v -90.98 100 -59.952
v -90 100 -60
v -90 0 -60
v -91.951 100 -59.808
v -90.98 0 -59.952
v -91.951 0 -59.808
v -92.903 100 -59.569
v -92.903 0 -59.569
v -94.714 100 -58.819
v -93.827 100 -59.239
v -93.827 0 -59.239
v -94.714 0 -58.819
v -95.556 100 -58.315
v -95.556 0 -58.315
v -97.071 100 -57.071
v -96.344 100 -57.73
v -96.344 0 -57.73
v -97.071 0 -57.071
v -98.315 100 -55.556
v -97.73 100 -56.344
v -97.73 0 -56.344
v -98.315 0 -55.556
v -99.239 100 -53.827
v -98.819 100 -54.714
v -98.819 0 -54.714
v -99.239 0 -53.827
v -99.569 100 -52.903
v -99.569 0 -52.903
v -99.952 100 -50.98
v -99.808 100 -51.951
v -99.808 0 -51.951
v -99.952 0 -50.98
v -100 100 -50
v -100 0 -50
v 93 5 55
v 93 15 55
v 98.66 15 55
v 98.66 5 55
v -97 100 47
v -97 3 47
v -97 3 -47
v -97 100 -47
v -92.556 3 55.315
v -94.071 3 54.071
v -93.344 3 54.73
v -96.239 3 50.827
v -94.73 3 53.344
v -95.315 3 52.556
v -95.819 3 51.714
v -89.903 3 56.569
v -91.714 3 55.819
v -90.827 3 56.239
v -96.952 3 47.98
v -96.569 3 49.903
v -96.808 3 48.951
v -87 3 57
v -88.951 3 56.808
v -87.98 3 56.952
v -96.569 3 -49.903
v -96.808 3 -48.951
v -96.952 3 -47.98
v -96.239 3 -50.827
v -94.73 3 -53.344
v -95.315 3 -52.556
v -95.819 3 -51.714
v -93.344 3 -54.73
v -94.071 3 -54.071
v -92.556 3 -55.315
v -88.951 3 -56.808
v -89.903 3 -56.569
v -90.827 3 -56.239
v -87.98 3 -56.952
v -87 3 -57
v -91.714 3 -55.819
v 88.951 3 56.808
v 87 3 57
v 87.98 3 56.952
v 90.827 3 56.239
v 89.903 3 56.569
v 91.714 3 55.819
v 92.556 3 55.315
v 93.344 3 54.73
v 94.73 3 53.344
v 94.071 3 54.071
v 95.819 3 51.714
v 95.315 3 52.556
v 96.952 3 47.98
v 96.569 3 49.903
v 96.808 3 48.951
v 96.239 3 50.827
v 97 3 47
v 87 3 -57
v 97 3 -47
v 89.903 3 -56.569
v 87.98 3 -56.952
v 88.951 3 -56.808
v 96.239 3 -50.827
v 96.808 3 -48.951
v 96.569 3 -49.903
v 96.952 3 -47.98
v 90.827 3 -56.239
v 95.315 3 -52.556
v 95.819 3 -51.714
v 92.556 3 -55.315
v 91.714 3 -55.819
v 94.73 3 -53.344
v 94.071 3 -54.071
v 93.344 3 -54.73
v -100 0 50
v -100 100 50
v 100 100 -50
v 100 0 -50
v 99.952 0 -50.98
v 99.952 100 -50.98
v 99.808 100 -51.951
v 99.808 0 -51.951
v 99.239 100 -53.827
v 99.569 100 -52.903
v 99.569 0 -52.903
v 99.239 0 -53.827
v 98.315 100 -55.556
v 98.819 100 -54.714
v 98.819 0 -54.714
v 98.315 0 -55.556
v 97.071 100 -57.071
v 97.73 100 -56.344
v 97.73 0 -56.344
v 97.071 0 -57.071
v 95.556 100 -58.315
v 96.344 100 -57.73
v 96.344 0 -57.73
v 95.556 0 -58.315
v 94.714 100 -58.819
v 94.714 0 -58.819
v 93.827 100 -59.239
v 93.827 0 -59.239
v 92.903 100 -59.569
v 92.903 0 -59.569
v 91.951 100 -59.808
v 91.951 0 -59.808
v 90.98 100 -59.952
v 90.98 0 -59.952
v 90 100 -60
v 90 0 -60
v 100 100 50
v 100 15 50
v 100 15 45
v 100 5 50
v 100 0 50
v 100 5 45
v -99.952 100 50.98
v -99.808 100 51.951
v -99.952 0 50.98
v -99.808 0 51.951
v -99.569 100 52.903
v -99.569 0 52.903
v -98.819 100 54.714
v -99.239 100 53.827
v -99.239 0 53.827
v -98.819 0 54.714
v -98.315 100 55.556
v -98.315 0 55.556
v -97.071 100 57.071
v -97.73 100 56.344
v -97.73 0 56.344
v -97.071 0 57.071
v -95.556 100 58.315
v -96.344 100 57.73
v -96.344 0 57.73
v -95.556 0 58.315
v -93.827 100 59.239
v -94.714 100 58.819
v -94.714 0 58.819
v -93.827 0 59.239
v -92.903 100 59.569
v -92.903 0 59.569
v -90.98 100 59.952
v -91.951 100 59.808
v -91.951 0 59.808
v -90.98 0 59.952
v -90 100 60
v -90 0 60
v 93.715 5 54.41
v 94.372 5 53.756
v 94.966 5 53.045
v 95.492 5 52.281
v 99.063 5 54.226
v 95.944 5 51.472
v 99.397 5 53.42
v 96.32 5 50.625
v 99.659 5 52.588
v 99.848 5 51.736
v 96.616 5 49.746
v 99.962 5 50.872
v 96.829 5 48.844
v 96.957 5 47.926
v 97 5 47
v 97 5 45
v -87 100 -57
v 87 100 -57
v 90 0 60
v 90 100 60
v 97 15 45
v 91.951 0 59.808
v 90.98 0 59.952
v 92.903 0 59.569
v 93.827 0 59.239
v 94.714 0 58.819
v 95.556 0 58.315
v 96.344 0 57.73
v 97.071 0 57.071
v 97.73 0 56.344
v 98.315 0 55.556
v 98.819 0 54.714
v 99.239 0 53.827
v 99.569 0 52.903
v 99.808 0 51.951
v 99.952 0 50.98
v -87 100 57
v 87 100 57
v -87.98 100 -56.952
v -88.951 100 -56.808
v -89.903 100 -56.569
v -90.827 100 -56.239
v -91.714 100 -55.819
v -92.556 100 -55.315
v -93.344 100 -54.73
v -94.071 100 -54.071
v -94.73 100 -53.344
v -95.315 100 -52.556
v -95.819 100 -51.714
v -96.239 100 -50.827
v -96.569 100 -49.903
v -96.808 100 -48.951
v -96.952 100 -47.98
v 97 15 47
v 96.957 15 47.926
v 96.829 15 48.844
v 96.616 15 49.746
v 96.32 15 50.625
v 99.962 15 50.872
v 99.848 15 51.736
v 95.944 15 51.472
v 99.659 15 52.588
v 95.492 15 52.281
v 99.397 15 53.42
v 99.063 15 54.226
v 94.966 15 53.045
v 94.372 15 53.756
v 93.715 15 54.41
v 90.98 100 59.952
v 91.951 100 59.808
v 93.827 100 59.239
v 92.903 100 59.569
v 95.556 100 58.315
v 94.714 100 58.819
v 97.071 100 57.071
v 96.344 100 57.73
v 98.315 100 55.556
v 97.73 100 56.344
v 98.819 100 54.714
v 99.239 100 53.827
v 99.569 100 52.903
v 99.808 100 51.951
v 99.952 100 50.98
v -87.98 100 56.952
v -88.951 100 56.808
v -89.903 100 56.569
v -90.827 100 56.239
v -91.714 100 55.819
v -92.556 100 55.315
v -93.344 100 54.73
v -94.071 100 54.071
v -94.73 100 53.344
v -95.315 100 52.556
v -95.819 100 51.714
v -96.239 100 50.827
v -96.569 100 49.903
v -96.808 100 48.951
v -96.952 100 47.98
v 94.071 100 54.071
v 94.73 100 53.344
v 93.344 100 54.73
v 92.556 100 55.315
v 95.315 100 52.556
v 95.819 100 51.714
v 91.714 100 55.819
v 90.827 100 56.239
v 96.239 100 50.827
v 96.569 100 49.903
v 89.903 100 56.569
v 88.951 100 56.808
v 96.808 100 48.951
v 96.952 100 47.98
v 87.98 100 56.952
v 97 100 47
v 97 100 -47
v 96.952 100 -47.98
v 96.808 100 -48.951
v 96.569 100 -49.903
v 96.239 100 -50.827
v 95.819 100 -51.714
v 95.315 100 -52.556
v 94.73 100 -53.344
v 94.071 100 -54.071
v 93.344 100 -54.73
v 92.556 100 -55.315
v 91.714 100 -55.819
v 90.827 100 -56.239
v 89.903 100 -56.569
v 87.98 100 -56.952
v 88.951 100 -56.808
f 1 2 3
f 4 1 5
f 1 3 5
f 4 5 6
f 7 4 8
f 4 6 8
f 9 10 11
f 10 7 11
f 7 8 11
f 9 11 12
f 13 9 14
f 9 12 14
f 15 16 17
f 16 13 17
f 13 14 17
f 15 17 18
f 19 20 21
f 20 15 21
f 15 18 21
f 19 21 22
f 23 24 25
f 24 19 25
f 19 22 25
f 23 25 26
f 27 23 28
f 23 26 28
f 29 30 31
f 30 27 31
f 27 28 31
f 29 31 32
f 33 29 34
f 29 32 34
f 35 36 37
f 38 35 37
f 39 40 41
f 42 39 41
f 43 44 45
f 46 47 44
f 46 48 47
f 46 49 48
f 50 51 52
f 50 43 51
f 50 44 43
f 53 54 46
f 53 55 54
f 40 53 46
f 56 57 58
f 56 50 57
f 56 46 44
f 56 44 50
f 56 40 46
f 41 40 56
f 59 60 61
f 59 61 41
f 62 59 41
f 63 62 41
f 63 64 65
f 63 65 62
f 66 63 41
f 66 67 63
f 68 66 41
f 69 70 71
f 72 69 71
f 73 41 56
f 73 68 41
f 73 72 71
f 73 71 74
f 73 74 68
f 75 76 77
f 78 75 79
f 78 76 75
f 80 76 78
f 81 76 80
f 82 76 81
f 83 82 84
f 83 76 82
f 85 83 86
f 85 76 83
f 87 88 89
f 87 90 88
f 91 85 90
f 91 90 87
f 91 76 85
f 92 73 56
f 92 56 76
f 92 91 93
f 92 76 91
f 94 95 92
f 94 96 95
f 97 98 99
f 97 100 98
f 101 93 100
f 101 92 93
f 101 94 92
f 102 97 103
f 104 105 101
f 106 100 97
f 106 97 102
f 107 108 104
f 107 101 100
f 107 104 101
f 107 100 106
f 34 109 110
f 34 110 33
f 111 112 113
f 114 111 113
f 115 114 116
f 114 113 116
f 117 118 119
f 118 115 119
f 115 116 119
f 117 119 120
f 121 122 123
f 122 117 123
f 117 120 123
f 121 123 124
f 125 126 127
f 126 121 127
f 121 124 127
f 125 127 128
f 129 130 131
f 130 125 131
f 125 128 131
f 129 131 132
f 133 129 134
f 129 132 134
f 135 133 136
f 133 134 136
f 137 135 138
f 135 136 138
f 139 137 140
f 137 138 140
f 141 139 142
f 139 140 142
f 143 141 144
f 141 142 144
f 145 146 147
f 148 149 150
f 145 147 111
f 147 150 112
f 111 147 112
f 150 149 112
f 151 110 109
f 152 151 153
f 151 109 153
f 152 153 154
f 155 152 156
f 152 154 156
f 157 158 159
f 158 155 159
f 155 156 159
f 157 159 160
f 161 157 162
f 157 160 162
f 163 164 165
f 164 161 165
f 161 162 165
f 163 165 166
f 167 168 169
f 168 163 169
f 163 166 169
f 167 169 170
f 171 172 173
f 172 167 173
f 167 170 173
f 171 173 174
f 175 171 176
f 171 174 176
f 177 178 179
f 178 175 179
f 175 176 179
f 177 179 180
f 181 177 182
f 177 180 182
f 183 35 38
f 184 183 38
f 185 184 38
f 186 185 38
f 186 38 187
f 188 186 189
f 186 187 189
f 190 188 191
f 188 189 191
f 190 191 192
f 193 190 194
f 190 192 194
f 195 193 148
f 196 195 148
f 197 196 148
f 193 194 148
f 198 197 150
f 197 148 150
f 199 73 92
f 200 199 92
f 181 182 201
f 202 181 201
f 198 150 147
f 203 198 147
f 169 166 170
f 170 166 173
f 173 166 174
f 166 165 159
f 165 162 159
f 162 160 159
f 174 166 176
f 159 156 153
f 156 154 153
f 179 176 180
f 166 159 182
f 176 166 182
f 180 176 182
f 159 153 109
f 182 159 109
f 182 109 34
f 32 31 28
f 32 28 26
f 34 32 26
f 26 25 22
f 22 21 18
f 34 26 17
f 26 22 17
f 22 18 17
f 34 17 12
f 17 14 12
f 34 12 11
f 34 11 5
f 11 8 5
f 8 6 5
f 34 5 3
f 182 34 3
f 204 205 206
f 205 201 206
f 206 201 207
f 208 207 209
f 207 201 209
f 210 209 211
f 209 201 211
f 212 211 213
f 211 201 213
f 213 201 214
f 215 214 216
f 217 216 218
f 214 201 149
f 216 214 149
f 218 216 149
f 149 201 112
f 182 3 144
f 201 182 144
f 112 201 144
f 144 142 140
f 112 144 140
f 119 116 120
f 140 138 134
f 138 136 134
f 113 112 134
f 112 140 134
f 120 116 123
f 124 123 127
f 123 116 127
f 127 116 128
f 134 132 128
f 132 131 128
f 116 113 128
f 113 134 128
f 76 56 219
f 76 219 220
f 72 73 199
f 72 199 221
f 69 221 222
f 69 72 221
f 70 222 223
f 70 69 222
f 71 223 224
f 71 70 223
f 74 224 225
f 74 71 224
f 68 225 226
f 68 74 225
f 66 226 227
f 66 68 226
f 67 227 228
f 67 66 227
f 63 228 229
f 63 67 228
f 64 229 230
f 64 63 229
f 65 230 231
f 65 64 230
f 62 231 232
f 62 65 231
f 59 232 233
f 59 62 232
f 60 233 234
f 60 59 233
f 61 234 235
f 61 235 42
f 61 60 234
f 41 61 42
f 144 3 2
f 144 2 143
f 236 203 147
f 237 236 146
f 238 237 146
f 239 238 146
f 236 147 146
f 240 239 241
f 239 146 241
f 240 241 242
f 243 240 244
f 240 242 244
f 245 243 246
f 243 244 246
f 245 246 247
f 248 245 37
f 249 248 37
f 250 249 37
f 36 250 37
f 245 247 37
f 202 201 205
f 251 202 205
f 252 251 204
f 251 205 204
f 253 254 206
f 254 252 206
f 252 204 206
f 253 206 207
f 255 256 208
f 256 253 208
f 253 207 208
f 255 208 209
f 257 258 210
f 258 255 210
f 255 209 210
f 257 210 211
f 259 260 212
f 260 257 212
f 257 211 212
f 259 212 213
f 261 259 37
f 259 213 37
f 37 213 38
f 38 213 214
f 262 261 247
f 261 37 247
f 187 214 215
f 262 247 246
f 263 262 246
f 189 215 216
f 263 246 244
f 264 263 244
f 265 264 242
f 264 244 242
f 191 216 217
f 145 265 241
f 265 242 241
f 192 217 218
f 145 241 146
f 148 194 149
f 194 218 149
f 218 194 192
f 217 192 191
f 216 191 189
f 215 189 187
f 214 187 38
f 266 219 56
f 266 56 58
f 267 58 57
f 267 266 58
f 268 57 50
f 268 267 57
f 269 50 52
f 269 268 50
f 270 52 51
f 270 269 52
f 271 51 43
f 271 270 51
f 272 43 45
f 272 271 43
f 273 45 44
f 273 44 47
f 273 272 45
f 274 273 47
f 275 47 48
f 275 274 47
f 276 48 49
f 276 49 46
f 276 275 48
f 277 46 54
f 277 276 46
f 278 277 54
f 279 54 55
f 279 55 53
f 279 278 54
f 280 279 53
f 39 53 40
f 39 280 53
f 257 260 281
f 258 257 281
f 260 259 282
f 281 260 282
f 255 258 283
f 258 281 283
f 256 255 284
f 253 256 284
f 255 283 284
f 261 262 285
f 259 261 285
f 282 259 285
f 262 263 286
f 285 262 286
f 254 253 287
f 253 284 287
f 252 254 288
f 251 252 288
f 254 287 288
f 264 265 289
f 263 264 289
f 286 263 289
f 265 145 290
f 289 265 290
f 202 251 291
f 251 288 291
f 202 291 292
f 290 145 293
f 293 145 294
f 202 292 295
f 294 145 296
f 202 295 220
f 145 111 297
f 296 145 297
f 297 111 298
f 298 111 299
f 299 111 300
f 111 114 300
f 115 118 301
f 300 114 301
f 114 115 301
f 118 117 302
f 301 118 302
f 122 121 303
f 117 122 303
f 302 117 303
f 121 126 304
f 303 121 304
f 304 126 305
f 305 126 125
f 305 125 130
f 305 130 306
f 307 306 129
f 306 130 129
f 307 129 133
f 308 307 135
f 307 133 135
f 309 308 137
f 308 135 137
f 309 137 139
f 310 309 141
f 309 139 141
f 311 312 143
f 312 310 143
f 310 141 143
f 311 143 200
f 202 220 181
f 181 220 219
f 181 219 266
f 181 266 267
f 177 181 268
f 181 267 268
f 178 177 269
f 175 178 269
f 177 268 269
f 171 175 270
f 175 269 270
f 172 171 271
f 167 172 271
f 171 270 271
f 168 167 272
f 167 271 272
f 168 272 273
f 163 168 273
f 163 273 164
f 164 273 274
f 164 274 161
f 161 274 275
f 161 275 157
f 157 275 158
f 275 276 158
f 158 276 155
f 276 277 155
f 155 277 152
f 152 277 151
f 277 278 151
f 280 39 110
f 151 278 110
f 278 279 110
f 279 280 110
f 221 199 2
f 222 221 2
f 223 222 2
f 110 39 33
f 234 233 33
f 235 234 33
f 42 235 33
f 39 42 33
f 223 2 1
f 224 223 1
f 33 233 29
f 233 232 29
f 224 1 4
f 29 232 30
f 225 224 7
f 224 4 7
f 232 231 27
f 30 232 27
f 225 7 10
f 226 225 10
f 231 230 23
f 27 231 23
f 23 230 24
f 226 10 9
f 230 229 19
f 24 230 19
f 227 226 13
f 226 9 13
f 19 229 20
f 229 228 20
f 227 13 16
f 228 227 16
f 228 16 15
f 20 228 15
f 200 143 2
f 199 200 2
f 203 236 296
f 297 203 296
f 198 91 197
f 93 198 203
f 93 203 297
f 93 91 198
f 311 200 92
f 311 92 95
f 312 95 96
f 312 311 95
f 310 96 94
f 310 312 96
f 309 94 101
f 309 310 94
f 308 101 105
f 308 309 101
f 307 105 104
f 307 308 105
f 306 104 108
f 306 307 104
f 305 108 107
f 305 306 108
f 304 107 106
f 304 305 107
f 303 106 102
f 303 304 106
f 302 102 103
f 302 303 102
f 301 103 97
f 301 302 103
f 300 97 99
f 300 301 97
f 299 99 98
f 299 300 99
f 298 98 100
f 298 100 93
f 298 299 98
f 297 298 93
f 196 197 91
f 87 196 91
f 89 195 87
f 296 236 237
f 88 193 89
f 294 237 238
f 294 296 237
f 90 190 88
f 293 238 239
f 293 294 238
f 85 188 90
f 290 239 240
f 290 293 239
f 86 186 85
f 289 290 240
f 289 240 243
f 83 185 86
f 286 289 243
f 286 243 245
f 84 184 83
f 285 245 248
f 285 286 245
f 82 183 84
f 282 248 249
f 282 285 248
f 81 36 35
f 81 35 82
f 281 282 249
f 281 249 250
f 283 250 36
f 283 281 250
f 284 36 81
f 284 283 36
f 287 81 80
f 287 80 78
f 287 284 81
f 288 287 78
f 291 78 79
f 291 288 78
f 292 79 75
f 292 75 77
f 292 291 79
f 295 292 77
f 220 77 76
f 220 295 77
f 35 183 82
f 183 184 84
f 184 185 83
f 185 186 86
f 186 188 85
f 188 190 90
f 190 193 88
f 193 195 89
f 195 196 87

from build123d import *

# Parameters (mm, degrees)
SKETCH1_W                      = 200
SKETCH1_H                      = 120
BOSS_EXTRUDE1_DEPTH            = 100
SHELL1_T                       = -3
CUT_EXTRUDE1_REACH             = 233.517
SKETCH5_W                      = 10
SKETCH5_H                      = 10
CUT_EXTRUDE1_DIRECTION_2_DEPTH = 232.516738056
FILLET2_R                      = 10
FILLET3_R                      = 10


with BuildPart() as part:
    # Sketch1 → Boss-Extrude1 (new body)
    with BuildSketch(Plane(origin=(0, 0, 0), x_dir=(1, 0, 0), z_dir=(0, 1, 0))):
        Rectangle(SKETCH1_W, SKETCH1_H)
    extrude(amount=BOSS_EXTRUDE1_DEPTH)

    # Shell1
    shell1_openings = [part.faces().sort_by_distance(p)[0] for p in [
        (0, 100, 0),
    ]]
    offset(amount=SHELL1_T, openings=shell1_openings, kind=Kind.INTERSECTION)

    # Sketch5 → Cut-Extrude1 (cut, up to next)
    with BuildSketch(Plane(origin=(100, 0, 0), x_dir=(0, 0, -1), z_dir=(1, 0, 0)), mode=Mode.PRIVATE) as cut_extrude1_sk1:
        with Locations((-50, 10)):
            Rectangle(SKETCH5_W, SKETCH5_H)
    cut_extrude1_tool1 = extrude(cut_extrude1_sk1.sketch, amount=-CUT_EXTRUDE1_REACH, mode=Mode.PRIVATE) & part.part
    add(cut_extrude1_tool1.solids().sort_by_distance((100, 10, 50))[0], mode=Mode.SUBTRACT)

    # Sketch5 → Cut-Extrude1 direction 2 (cut)
    with BuildSketch(Plane(origin=(100, 0, 0), x_dir=(0, 0, -1), z_dir=(1, 0, 0))):
        with Locations((-50, 10)):
            Rectangle(SKETCH5_W, SKETCH5_H)
    extrude(amount=CUT_EXTRUDE1_DIRECTION_2_DEPTH, mode=Mode.SUBTRACT)

    # Fillet2
    # the kernel refuses this fillet: 10 mm, written as the material it takes off along each edge
    with BuildSketch(Plane(origin=(-100, -25, -60), x_dir=(1, 0, 0), z_dir=(0, 1, 0)), Plane(origin=(-100, -25, 60), x_dir=(0, 0, -1), z_dir=(0, 1, 0))) as fillet2_piece_1:
        with BuildLine():
            CenterArc((FILLET2_R, -FILLET2_R), FILLET2_R, 90, 90)
            Line((0, -FILLET2_R), (0, 0))
            Line((0, 0), (FILLET2_R, 0))
        make_face()
    extrude(amount=150, mode=Mode.SUBTRACT)
    with BuildSketch(Plane(origin=(100, -25, 60), x_dir=(0, 0, -1), z_dir=(0, 1, 0)), Plane(origin=(100, -25, -60), x_dir=(-1, 0, 0), z_dir=(0, 1, 0))) as fillet2_piece_2:
        with BuildLine():
            CenterArc((FILLET2_R, FILLET2_R), FILLET2_R, 180, 90)
            Line((0, FILLET2_R), (0, 0))
            Line((0, 0), (FILLET2_R, 0))
        make_face()
    extrude(amount=150, mode=Mode.SUBTRACT)

    # Fillet3
    # the kernel refuses this fillet: 10 mm, written as the material it adds along each edge
    with BuildSketch(Plane(origin=(-97, 100, 57), x_dir=(0, 0, -1), z_dir=(0, -1, 0))) as fillet3_piece_1:
        with BuildLine():
            CenterArc((FILLET3_R, FILLET3_R), FILLET3_R, 180, 90)
            Line((0, FILLET3_R), (0, 0))
            Line((0, 0), (FILLET3_R, 0))
        make_face()
    extrude(amount=97)
    with BuildSketch(Plane(origin=(97, 100, 57), x_dir=(0, 0, -1), z_dir=(0, -1, 0))) as fillet3_piece_2_section:
        with BuildLine():
            CenterArc((FILLET3_R, -FILLET3_R), FILLET3_R, 90, 90)
            Line((0, -FILLET3_R), (0, 0))
            Line((0, 0), (FILLET3_R, 0))
        make_face()
    fillet3_piece_2 = extrude(amount=97, mode=Mode.PRIVATE)
    fillet3_piece_2 = split(fillet3_piece_2, bisect_by=Plane(origin=(96.033482281, 15, 52.791302356), z_dir=(0, 1, 0)), keep=Keep.TOP, mode=Mode.PRIVATE)
    fillet3_piece_2 = split(fillet3_piece_2, bisect_by=Plane(origin=(96.033482281, 57.5, 55), z_dir=(0, 0, -1)), keep=Keep.TOP, mode=Mode.PRIVATE)
    add(fillet3_piece_2)
    with BuildSketch(Plane(origin=(97, 100, 57), x_dir=(0, 0, -1), z_dir=(0, -1, 0))) as fillet3_piece_3_section:
        with BuildLine():
            CenterArc((FILLET3_R, -FILLET3_R), FILLET3_R, 90, 90)
            Line((0, -FILLET3_R), (0, 0))
            Line((0, 0), (FILLET3_R, 0))
        make_face()
    fillet3_piece_3 = extrude(amount=97, mode=Mode.PRIVATE)
    fillet3_piece_3 = split(fillet3_piece_3, bisect_by=Plane(origin=(93.714174943, 15, 56.26775421), z_dir=(0, 1, 0)), keep=Keep.TOP, mode=Mode.PRIVATE)
    fillet3_piece_3 = split(fillet3_piece_3, bisect_by=Plane(origin=(93.714174943, 57.5, 55), z_dir=(0, 0, 1)), keep=Keep.TOP, mode=Mode.PRIVATE)
    add(fillet3_piece_3)
    with BuildSketch(Plane(origin=(97, 100, 57), x_dir=(0, 0, -1), z_dir=(0, -1, 0))) as fillet3_piece_4_section:
        with BuildLine():
            CenterArc((FILLET3_R, -FILLET3_R), FILLET3_R, 90, 90)
            Line((0, -FILLET3_R), (0, 0))
            Line((0, 0), (FILLET3_R, 0))
        make_face()
    fillet3_piece_4 = extrude(amount=97, mode=Mode.PRIVATE)
    fillet3_piece_4 = split(fillet3_piece_4, bisect_by=Plane(origin=(93.714174943, 15, 56.26775421), z_dir=(0, -1, 0)), keep=Keep.TOP, mode=Mode.PRIVATE)
    fillet3_piece_4 = split(fillet3_piece_4, bisect_by=Plane(origin=(93.714174943, 10, 55), z_dir=(0, 0, 1)), keep=Keep.TOP, mode=Mode.PRIVATE)
    fillet3_piece_4 = split(fillet3_piece_4, bisect_by=Plane(origin=(93.714174943, 5, 56.26775421), z_dir=(0, 1, 0)), keep=Keep.TOP, mode=Mode.PRIVATE)
    add(fillet3_piece_4)
    with BuildSketch(Plane(origin=(97, 100, 57), x_dir=(0, 0, -1), z_dir=(0, -1, 0))) as fillet3_piece_5_section:
        with BuildLine():
            CenterArc((FILLET3_R, -FILLET3_R), FILLET3_R, 90, 90)
            Line((0, -FILLET3_R), (0, 0))
            Line((0, 0), (FILLET3_R, 0))
        make_face()
    fillet3_piece_5 = extrude(amount=97, mode=Mode.PRIVATE)
    fillet3_piece_5 = split(fillet3_piece_5, bisect_by=Plane(origin=(96.033482281, 4, 55), z_dir=(0, 0, -1)), keep=Keep.TOP, mode=Mode.PRIVATE)
    fillet3_piece_5 = split(fillet3_piece_5, bisect_by=Plane(origin=(96.033482281, 5, 52.791302356), z_dir=(0, -1, 0)), keep=Keep.TOP, mode=Mode.PRIVATE)
    add(fillet3_piece_5)
    with BuildSketch(Plane(origin=(97, 100, 57), x_dir=(0, 0, -1), z_dir=(0, -1, 0))) as fillet3_piece_6_section:
        with BuildLine():
            CenterArc((FILLET3_R, -FILLET3_R), FILLET3_R, 90, 90)
            Line((0, -FILLET3_R), (0, 0))
            Line((0, 0), (FILLET3_R, 0))
        make_face()
    fillet3_piece_6 = extrude(amount=97, mode=Mode.PRIVATE)
    fillet3_piece_6 = split(fillet3_piece_6, bisect_by=Plane(origin=(93.714174943, 4, 55), z_dir=(0, 0, 1)), keep=Keep.TOP, mode=Mode.PRIVATE)
    fillet3_piece_6 = split(fillet3_piece_6, bisect_by=Plane(origin=(93.714174943, 5, 56.26775421), z_dir=(0, -1, 0)), keep=Keep.TOP, mode=Mode.PRIVATE)
    add(fillet3_piece_6)
    with BuildSketch(Plane(origin=(-97, 3, -57), x_dir=(1, 0, 0), z_dir=(0, 1, 0)), Plane(origin=(97, 100, -57), x_dir=(-1, 0, 0), z_dir=(0, -1, 0))) as fillet3_piece_7:
        with BuildLine():
            CenterArc((FILLET3_R, -FILLET3_R), FILLET3_R, 90, 90)
            Line((0, -FILLET3_R), (0, 0))
            Line((0, 0), (FILLET3_R, 0))
        make_face()
    extrude(amount=97)


solid = part.part
